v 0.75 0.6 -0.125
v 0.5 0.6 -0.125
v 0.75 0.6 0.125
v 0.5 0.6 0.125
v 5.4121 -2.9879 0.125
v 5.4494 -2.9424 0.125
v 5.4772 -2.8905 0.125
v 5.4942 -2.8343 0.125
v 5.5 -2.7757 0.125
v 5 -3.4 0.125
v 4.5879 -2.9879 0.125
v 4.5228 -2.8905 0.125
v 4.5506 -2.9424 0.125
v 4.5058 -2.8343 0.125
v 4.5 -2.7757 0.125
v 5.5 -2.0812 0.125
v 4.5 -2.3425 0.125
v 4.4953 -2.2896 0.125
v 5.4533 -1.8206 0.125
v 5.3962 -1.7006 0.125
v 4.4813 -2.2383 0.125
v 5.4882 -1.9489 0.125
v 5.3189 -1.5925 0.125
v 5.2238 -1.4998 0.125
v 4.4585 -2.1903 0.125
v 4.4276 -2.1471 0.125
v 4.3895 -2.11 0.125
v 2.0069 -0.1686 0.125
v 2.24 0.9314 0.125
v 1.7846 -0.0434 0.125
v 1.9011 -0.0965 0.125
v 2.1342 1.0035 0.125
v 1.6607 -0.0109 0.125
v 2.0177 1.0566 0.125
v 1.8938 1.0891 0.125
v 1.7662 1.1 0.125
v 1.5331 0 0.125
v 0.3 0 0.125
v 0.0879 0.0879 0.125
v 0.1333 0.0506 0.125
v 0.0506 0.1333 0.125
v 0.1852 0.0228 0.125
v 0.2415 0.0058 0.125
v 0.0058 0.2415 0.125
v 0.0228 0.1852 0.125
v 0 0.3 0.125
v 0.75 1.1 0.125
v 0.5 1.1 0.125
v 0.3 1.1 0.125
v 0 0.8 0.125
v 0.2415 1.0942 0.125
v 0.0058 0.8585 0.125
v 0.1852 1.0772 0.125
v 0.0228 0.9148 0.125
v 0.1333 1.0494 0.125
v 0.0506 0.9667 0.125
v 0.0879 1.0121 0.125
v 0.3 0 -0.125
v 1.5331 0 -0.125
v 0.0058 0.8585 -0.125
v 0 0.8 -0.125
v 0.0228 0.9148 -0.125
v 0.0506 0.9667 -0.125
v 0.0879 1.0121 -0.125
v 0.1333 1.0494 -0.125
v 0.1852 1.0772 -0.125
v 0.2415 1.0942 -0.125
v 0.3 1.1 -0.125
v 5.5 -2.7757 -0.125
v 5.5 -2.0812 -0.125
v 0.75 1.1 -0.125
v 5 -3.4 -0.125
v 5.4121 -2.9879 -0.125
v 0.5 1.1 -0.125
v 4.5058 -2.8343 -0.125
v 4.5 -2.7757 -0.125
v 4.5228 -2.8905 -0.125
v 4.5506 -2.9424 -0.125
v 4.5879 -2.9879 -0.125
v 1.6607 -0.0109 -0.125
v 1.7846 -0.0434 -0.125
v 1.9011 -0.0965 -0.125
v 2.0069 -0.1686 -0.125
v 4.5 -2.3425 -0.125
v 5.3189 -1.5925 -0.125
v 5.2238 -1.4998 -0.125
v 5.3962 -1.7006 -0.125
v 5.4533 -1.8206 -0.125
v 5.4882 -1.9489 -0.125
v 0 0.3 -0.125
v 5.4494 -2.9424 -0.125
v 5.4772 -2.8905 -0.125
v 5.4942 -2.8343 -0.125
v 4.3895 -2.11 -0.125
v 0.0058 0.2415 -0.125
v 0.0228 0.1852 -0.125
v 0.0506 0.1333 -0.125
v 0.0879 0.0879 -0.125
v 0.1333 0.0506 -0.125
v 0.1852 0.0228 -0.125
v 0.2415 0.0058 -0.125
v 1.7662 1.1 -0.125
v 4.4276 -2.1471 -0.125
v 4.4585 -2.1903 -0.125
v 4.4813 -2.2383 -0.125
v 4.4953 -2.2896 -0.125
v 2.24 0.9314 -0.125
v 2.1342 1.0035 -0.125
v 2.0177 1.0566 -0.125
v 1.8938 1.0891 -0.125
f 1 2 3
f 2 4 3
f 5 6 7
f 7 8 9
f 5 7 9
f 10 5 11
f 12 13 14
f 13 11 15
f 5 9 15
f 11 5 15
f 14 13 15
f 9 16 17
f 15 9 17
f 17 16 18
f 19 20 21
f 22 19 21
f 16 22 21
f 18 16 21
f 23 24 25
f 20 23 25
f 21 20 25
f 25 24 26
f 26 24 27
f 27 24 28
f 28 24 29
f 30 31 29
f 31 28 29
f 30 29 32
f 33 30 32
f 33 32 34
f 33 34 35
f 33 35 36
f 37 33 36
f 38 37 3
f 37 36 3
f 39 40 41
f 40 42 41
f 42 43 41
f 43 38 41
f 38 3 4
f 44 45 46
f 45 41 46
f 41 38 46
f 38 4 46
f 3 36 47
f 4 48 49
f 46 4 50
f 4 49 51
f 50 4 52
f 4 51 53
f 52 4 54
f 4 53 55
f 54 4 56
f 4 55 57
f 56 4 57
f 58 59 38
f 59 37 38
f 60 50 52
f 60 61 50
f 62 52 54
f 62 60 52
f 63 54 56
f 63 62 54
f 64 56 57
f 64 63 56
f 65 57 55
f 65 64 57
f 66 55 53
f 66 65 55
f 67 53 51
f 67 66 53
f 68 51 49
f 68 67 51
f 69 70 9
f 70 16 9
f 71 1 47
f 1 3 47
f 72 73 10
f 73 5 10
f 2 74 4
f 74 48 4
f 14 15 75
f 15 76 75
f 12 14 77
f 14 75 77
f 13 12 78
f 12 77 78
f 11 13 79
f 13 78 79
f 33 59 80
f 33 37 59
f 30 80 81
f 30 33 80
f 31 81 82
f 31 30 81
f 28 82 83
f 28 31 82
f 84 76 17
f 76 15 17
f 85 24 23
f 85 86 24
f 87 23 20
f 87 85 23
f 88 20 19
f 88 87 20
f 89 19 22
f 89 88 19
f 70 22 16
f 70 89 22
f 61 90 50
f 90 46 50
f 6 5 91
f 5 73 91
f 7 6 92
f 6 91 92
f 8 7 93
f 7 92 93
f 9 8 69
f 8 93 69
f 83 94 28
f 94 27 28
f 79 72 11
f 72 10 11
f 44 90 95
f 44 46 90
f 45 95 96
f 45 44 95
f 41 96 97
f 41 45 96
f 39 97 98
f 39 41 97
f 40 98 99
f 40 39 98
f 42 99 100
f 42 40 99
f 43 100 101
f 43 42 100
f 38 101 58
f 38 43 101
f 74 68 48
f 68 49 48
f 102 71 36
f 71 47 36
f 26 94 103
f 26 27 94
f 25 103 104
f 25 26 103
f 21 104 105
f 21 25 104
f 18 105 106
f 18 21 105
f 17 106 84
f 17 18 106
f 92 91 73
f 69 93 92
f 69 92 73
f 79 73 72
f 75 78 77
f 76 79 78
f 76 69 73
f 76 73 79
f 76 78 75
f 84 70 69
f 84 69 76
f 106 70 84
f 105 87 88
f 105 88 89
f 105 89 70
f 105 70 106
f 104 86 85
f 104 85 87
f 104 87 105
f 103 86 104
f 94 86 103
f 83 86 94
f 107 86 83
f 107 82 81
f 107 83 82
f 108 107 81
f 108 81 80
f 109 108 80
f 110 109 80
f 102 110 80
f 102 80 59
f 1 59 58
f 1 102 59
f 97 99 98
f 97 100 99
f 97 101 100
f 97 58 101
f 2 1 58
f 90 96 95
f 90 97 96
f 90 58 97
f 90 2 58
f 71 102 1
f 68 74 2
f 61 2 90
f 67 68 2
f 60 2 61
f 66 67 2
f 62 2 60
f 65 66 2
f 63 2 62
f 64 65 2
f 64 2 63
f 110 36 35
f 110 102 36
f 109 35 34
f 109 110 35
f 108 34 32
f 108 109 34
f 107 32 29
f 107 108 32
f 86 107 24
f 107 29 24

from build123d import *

# Parameters (mm, degrees)
BOSS_EXTRUDE1_DEPTH = 0.125
FILLET1_R           = 0.3
FILLET2_R           = 0.75


with BuildPart() as part:
    # frame_outline → Boss-Extrude1 (new, symmetric)
    with BuildSketch(Plane.XY):
        Polygon((0, 0), (0, 1.1), (0.5, 1.1), (0.5, 0.6), (0.75, 0.6), (0.75, 1.1), (2.033097706, 1.1), (5.5, -1.724883351), (5.5, -2.9), (5, -3.4), (4.5, -2.9), (4.5, -2.2), (1.8, 0), align=None)
    extrude(amount=BOSS_EXTRUDE1_DEPTH, both=True)

    # Fillet1
    fillet1_edges = [part.edges().sort_by_distance(p)[0] for p in [
        (0, 0, 0),
        (0, 1.1, 0),
        (5.5, -2.9, 0),
        (4.5, -2.9, 0),
        (4.5, -2.2, 0),
    ]]
    fillet(fillet1_edges, radius=FILLET1_R)

    # Fillet2
    fillet2_edges = [part.edges().sort_by_distance(p)[0] for p in [
        (2.033097706, 1.1, 0),
        (5.5, -1.724883351, 0),
        (1.8, 0, 0),
    ]]
    fillet(fillet2_edges, radius=FILLET2_R)


solid = part.part
